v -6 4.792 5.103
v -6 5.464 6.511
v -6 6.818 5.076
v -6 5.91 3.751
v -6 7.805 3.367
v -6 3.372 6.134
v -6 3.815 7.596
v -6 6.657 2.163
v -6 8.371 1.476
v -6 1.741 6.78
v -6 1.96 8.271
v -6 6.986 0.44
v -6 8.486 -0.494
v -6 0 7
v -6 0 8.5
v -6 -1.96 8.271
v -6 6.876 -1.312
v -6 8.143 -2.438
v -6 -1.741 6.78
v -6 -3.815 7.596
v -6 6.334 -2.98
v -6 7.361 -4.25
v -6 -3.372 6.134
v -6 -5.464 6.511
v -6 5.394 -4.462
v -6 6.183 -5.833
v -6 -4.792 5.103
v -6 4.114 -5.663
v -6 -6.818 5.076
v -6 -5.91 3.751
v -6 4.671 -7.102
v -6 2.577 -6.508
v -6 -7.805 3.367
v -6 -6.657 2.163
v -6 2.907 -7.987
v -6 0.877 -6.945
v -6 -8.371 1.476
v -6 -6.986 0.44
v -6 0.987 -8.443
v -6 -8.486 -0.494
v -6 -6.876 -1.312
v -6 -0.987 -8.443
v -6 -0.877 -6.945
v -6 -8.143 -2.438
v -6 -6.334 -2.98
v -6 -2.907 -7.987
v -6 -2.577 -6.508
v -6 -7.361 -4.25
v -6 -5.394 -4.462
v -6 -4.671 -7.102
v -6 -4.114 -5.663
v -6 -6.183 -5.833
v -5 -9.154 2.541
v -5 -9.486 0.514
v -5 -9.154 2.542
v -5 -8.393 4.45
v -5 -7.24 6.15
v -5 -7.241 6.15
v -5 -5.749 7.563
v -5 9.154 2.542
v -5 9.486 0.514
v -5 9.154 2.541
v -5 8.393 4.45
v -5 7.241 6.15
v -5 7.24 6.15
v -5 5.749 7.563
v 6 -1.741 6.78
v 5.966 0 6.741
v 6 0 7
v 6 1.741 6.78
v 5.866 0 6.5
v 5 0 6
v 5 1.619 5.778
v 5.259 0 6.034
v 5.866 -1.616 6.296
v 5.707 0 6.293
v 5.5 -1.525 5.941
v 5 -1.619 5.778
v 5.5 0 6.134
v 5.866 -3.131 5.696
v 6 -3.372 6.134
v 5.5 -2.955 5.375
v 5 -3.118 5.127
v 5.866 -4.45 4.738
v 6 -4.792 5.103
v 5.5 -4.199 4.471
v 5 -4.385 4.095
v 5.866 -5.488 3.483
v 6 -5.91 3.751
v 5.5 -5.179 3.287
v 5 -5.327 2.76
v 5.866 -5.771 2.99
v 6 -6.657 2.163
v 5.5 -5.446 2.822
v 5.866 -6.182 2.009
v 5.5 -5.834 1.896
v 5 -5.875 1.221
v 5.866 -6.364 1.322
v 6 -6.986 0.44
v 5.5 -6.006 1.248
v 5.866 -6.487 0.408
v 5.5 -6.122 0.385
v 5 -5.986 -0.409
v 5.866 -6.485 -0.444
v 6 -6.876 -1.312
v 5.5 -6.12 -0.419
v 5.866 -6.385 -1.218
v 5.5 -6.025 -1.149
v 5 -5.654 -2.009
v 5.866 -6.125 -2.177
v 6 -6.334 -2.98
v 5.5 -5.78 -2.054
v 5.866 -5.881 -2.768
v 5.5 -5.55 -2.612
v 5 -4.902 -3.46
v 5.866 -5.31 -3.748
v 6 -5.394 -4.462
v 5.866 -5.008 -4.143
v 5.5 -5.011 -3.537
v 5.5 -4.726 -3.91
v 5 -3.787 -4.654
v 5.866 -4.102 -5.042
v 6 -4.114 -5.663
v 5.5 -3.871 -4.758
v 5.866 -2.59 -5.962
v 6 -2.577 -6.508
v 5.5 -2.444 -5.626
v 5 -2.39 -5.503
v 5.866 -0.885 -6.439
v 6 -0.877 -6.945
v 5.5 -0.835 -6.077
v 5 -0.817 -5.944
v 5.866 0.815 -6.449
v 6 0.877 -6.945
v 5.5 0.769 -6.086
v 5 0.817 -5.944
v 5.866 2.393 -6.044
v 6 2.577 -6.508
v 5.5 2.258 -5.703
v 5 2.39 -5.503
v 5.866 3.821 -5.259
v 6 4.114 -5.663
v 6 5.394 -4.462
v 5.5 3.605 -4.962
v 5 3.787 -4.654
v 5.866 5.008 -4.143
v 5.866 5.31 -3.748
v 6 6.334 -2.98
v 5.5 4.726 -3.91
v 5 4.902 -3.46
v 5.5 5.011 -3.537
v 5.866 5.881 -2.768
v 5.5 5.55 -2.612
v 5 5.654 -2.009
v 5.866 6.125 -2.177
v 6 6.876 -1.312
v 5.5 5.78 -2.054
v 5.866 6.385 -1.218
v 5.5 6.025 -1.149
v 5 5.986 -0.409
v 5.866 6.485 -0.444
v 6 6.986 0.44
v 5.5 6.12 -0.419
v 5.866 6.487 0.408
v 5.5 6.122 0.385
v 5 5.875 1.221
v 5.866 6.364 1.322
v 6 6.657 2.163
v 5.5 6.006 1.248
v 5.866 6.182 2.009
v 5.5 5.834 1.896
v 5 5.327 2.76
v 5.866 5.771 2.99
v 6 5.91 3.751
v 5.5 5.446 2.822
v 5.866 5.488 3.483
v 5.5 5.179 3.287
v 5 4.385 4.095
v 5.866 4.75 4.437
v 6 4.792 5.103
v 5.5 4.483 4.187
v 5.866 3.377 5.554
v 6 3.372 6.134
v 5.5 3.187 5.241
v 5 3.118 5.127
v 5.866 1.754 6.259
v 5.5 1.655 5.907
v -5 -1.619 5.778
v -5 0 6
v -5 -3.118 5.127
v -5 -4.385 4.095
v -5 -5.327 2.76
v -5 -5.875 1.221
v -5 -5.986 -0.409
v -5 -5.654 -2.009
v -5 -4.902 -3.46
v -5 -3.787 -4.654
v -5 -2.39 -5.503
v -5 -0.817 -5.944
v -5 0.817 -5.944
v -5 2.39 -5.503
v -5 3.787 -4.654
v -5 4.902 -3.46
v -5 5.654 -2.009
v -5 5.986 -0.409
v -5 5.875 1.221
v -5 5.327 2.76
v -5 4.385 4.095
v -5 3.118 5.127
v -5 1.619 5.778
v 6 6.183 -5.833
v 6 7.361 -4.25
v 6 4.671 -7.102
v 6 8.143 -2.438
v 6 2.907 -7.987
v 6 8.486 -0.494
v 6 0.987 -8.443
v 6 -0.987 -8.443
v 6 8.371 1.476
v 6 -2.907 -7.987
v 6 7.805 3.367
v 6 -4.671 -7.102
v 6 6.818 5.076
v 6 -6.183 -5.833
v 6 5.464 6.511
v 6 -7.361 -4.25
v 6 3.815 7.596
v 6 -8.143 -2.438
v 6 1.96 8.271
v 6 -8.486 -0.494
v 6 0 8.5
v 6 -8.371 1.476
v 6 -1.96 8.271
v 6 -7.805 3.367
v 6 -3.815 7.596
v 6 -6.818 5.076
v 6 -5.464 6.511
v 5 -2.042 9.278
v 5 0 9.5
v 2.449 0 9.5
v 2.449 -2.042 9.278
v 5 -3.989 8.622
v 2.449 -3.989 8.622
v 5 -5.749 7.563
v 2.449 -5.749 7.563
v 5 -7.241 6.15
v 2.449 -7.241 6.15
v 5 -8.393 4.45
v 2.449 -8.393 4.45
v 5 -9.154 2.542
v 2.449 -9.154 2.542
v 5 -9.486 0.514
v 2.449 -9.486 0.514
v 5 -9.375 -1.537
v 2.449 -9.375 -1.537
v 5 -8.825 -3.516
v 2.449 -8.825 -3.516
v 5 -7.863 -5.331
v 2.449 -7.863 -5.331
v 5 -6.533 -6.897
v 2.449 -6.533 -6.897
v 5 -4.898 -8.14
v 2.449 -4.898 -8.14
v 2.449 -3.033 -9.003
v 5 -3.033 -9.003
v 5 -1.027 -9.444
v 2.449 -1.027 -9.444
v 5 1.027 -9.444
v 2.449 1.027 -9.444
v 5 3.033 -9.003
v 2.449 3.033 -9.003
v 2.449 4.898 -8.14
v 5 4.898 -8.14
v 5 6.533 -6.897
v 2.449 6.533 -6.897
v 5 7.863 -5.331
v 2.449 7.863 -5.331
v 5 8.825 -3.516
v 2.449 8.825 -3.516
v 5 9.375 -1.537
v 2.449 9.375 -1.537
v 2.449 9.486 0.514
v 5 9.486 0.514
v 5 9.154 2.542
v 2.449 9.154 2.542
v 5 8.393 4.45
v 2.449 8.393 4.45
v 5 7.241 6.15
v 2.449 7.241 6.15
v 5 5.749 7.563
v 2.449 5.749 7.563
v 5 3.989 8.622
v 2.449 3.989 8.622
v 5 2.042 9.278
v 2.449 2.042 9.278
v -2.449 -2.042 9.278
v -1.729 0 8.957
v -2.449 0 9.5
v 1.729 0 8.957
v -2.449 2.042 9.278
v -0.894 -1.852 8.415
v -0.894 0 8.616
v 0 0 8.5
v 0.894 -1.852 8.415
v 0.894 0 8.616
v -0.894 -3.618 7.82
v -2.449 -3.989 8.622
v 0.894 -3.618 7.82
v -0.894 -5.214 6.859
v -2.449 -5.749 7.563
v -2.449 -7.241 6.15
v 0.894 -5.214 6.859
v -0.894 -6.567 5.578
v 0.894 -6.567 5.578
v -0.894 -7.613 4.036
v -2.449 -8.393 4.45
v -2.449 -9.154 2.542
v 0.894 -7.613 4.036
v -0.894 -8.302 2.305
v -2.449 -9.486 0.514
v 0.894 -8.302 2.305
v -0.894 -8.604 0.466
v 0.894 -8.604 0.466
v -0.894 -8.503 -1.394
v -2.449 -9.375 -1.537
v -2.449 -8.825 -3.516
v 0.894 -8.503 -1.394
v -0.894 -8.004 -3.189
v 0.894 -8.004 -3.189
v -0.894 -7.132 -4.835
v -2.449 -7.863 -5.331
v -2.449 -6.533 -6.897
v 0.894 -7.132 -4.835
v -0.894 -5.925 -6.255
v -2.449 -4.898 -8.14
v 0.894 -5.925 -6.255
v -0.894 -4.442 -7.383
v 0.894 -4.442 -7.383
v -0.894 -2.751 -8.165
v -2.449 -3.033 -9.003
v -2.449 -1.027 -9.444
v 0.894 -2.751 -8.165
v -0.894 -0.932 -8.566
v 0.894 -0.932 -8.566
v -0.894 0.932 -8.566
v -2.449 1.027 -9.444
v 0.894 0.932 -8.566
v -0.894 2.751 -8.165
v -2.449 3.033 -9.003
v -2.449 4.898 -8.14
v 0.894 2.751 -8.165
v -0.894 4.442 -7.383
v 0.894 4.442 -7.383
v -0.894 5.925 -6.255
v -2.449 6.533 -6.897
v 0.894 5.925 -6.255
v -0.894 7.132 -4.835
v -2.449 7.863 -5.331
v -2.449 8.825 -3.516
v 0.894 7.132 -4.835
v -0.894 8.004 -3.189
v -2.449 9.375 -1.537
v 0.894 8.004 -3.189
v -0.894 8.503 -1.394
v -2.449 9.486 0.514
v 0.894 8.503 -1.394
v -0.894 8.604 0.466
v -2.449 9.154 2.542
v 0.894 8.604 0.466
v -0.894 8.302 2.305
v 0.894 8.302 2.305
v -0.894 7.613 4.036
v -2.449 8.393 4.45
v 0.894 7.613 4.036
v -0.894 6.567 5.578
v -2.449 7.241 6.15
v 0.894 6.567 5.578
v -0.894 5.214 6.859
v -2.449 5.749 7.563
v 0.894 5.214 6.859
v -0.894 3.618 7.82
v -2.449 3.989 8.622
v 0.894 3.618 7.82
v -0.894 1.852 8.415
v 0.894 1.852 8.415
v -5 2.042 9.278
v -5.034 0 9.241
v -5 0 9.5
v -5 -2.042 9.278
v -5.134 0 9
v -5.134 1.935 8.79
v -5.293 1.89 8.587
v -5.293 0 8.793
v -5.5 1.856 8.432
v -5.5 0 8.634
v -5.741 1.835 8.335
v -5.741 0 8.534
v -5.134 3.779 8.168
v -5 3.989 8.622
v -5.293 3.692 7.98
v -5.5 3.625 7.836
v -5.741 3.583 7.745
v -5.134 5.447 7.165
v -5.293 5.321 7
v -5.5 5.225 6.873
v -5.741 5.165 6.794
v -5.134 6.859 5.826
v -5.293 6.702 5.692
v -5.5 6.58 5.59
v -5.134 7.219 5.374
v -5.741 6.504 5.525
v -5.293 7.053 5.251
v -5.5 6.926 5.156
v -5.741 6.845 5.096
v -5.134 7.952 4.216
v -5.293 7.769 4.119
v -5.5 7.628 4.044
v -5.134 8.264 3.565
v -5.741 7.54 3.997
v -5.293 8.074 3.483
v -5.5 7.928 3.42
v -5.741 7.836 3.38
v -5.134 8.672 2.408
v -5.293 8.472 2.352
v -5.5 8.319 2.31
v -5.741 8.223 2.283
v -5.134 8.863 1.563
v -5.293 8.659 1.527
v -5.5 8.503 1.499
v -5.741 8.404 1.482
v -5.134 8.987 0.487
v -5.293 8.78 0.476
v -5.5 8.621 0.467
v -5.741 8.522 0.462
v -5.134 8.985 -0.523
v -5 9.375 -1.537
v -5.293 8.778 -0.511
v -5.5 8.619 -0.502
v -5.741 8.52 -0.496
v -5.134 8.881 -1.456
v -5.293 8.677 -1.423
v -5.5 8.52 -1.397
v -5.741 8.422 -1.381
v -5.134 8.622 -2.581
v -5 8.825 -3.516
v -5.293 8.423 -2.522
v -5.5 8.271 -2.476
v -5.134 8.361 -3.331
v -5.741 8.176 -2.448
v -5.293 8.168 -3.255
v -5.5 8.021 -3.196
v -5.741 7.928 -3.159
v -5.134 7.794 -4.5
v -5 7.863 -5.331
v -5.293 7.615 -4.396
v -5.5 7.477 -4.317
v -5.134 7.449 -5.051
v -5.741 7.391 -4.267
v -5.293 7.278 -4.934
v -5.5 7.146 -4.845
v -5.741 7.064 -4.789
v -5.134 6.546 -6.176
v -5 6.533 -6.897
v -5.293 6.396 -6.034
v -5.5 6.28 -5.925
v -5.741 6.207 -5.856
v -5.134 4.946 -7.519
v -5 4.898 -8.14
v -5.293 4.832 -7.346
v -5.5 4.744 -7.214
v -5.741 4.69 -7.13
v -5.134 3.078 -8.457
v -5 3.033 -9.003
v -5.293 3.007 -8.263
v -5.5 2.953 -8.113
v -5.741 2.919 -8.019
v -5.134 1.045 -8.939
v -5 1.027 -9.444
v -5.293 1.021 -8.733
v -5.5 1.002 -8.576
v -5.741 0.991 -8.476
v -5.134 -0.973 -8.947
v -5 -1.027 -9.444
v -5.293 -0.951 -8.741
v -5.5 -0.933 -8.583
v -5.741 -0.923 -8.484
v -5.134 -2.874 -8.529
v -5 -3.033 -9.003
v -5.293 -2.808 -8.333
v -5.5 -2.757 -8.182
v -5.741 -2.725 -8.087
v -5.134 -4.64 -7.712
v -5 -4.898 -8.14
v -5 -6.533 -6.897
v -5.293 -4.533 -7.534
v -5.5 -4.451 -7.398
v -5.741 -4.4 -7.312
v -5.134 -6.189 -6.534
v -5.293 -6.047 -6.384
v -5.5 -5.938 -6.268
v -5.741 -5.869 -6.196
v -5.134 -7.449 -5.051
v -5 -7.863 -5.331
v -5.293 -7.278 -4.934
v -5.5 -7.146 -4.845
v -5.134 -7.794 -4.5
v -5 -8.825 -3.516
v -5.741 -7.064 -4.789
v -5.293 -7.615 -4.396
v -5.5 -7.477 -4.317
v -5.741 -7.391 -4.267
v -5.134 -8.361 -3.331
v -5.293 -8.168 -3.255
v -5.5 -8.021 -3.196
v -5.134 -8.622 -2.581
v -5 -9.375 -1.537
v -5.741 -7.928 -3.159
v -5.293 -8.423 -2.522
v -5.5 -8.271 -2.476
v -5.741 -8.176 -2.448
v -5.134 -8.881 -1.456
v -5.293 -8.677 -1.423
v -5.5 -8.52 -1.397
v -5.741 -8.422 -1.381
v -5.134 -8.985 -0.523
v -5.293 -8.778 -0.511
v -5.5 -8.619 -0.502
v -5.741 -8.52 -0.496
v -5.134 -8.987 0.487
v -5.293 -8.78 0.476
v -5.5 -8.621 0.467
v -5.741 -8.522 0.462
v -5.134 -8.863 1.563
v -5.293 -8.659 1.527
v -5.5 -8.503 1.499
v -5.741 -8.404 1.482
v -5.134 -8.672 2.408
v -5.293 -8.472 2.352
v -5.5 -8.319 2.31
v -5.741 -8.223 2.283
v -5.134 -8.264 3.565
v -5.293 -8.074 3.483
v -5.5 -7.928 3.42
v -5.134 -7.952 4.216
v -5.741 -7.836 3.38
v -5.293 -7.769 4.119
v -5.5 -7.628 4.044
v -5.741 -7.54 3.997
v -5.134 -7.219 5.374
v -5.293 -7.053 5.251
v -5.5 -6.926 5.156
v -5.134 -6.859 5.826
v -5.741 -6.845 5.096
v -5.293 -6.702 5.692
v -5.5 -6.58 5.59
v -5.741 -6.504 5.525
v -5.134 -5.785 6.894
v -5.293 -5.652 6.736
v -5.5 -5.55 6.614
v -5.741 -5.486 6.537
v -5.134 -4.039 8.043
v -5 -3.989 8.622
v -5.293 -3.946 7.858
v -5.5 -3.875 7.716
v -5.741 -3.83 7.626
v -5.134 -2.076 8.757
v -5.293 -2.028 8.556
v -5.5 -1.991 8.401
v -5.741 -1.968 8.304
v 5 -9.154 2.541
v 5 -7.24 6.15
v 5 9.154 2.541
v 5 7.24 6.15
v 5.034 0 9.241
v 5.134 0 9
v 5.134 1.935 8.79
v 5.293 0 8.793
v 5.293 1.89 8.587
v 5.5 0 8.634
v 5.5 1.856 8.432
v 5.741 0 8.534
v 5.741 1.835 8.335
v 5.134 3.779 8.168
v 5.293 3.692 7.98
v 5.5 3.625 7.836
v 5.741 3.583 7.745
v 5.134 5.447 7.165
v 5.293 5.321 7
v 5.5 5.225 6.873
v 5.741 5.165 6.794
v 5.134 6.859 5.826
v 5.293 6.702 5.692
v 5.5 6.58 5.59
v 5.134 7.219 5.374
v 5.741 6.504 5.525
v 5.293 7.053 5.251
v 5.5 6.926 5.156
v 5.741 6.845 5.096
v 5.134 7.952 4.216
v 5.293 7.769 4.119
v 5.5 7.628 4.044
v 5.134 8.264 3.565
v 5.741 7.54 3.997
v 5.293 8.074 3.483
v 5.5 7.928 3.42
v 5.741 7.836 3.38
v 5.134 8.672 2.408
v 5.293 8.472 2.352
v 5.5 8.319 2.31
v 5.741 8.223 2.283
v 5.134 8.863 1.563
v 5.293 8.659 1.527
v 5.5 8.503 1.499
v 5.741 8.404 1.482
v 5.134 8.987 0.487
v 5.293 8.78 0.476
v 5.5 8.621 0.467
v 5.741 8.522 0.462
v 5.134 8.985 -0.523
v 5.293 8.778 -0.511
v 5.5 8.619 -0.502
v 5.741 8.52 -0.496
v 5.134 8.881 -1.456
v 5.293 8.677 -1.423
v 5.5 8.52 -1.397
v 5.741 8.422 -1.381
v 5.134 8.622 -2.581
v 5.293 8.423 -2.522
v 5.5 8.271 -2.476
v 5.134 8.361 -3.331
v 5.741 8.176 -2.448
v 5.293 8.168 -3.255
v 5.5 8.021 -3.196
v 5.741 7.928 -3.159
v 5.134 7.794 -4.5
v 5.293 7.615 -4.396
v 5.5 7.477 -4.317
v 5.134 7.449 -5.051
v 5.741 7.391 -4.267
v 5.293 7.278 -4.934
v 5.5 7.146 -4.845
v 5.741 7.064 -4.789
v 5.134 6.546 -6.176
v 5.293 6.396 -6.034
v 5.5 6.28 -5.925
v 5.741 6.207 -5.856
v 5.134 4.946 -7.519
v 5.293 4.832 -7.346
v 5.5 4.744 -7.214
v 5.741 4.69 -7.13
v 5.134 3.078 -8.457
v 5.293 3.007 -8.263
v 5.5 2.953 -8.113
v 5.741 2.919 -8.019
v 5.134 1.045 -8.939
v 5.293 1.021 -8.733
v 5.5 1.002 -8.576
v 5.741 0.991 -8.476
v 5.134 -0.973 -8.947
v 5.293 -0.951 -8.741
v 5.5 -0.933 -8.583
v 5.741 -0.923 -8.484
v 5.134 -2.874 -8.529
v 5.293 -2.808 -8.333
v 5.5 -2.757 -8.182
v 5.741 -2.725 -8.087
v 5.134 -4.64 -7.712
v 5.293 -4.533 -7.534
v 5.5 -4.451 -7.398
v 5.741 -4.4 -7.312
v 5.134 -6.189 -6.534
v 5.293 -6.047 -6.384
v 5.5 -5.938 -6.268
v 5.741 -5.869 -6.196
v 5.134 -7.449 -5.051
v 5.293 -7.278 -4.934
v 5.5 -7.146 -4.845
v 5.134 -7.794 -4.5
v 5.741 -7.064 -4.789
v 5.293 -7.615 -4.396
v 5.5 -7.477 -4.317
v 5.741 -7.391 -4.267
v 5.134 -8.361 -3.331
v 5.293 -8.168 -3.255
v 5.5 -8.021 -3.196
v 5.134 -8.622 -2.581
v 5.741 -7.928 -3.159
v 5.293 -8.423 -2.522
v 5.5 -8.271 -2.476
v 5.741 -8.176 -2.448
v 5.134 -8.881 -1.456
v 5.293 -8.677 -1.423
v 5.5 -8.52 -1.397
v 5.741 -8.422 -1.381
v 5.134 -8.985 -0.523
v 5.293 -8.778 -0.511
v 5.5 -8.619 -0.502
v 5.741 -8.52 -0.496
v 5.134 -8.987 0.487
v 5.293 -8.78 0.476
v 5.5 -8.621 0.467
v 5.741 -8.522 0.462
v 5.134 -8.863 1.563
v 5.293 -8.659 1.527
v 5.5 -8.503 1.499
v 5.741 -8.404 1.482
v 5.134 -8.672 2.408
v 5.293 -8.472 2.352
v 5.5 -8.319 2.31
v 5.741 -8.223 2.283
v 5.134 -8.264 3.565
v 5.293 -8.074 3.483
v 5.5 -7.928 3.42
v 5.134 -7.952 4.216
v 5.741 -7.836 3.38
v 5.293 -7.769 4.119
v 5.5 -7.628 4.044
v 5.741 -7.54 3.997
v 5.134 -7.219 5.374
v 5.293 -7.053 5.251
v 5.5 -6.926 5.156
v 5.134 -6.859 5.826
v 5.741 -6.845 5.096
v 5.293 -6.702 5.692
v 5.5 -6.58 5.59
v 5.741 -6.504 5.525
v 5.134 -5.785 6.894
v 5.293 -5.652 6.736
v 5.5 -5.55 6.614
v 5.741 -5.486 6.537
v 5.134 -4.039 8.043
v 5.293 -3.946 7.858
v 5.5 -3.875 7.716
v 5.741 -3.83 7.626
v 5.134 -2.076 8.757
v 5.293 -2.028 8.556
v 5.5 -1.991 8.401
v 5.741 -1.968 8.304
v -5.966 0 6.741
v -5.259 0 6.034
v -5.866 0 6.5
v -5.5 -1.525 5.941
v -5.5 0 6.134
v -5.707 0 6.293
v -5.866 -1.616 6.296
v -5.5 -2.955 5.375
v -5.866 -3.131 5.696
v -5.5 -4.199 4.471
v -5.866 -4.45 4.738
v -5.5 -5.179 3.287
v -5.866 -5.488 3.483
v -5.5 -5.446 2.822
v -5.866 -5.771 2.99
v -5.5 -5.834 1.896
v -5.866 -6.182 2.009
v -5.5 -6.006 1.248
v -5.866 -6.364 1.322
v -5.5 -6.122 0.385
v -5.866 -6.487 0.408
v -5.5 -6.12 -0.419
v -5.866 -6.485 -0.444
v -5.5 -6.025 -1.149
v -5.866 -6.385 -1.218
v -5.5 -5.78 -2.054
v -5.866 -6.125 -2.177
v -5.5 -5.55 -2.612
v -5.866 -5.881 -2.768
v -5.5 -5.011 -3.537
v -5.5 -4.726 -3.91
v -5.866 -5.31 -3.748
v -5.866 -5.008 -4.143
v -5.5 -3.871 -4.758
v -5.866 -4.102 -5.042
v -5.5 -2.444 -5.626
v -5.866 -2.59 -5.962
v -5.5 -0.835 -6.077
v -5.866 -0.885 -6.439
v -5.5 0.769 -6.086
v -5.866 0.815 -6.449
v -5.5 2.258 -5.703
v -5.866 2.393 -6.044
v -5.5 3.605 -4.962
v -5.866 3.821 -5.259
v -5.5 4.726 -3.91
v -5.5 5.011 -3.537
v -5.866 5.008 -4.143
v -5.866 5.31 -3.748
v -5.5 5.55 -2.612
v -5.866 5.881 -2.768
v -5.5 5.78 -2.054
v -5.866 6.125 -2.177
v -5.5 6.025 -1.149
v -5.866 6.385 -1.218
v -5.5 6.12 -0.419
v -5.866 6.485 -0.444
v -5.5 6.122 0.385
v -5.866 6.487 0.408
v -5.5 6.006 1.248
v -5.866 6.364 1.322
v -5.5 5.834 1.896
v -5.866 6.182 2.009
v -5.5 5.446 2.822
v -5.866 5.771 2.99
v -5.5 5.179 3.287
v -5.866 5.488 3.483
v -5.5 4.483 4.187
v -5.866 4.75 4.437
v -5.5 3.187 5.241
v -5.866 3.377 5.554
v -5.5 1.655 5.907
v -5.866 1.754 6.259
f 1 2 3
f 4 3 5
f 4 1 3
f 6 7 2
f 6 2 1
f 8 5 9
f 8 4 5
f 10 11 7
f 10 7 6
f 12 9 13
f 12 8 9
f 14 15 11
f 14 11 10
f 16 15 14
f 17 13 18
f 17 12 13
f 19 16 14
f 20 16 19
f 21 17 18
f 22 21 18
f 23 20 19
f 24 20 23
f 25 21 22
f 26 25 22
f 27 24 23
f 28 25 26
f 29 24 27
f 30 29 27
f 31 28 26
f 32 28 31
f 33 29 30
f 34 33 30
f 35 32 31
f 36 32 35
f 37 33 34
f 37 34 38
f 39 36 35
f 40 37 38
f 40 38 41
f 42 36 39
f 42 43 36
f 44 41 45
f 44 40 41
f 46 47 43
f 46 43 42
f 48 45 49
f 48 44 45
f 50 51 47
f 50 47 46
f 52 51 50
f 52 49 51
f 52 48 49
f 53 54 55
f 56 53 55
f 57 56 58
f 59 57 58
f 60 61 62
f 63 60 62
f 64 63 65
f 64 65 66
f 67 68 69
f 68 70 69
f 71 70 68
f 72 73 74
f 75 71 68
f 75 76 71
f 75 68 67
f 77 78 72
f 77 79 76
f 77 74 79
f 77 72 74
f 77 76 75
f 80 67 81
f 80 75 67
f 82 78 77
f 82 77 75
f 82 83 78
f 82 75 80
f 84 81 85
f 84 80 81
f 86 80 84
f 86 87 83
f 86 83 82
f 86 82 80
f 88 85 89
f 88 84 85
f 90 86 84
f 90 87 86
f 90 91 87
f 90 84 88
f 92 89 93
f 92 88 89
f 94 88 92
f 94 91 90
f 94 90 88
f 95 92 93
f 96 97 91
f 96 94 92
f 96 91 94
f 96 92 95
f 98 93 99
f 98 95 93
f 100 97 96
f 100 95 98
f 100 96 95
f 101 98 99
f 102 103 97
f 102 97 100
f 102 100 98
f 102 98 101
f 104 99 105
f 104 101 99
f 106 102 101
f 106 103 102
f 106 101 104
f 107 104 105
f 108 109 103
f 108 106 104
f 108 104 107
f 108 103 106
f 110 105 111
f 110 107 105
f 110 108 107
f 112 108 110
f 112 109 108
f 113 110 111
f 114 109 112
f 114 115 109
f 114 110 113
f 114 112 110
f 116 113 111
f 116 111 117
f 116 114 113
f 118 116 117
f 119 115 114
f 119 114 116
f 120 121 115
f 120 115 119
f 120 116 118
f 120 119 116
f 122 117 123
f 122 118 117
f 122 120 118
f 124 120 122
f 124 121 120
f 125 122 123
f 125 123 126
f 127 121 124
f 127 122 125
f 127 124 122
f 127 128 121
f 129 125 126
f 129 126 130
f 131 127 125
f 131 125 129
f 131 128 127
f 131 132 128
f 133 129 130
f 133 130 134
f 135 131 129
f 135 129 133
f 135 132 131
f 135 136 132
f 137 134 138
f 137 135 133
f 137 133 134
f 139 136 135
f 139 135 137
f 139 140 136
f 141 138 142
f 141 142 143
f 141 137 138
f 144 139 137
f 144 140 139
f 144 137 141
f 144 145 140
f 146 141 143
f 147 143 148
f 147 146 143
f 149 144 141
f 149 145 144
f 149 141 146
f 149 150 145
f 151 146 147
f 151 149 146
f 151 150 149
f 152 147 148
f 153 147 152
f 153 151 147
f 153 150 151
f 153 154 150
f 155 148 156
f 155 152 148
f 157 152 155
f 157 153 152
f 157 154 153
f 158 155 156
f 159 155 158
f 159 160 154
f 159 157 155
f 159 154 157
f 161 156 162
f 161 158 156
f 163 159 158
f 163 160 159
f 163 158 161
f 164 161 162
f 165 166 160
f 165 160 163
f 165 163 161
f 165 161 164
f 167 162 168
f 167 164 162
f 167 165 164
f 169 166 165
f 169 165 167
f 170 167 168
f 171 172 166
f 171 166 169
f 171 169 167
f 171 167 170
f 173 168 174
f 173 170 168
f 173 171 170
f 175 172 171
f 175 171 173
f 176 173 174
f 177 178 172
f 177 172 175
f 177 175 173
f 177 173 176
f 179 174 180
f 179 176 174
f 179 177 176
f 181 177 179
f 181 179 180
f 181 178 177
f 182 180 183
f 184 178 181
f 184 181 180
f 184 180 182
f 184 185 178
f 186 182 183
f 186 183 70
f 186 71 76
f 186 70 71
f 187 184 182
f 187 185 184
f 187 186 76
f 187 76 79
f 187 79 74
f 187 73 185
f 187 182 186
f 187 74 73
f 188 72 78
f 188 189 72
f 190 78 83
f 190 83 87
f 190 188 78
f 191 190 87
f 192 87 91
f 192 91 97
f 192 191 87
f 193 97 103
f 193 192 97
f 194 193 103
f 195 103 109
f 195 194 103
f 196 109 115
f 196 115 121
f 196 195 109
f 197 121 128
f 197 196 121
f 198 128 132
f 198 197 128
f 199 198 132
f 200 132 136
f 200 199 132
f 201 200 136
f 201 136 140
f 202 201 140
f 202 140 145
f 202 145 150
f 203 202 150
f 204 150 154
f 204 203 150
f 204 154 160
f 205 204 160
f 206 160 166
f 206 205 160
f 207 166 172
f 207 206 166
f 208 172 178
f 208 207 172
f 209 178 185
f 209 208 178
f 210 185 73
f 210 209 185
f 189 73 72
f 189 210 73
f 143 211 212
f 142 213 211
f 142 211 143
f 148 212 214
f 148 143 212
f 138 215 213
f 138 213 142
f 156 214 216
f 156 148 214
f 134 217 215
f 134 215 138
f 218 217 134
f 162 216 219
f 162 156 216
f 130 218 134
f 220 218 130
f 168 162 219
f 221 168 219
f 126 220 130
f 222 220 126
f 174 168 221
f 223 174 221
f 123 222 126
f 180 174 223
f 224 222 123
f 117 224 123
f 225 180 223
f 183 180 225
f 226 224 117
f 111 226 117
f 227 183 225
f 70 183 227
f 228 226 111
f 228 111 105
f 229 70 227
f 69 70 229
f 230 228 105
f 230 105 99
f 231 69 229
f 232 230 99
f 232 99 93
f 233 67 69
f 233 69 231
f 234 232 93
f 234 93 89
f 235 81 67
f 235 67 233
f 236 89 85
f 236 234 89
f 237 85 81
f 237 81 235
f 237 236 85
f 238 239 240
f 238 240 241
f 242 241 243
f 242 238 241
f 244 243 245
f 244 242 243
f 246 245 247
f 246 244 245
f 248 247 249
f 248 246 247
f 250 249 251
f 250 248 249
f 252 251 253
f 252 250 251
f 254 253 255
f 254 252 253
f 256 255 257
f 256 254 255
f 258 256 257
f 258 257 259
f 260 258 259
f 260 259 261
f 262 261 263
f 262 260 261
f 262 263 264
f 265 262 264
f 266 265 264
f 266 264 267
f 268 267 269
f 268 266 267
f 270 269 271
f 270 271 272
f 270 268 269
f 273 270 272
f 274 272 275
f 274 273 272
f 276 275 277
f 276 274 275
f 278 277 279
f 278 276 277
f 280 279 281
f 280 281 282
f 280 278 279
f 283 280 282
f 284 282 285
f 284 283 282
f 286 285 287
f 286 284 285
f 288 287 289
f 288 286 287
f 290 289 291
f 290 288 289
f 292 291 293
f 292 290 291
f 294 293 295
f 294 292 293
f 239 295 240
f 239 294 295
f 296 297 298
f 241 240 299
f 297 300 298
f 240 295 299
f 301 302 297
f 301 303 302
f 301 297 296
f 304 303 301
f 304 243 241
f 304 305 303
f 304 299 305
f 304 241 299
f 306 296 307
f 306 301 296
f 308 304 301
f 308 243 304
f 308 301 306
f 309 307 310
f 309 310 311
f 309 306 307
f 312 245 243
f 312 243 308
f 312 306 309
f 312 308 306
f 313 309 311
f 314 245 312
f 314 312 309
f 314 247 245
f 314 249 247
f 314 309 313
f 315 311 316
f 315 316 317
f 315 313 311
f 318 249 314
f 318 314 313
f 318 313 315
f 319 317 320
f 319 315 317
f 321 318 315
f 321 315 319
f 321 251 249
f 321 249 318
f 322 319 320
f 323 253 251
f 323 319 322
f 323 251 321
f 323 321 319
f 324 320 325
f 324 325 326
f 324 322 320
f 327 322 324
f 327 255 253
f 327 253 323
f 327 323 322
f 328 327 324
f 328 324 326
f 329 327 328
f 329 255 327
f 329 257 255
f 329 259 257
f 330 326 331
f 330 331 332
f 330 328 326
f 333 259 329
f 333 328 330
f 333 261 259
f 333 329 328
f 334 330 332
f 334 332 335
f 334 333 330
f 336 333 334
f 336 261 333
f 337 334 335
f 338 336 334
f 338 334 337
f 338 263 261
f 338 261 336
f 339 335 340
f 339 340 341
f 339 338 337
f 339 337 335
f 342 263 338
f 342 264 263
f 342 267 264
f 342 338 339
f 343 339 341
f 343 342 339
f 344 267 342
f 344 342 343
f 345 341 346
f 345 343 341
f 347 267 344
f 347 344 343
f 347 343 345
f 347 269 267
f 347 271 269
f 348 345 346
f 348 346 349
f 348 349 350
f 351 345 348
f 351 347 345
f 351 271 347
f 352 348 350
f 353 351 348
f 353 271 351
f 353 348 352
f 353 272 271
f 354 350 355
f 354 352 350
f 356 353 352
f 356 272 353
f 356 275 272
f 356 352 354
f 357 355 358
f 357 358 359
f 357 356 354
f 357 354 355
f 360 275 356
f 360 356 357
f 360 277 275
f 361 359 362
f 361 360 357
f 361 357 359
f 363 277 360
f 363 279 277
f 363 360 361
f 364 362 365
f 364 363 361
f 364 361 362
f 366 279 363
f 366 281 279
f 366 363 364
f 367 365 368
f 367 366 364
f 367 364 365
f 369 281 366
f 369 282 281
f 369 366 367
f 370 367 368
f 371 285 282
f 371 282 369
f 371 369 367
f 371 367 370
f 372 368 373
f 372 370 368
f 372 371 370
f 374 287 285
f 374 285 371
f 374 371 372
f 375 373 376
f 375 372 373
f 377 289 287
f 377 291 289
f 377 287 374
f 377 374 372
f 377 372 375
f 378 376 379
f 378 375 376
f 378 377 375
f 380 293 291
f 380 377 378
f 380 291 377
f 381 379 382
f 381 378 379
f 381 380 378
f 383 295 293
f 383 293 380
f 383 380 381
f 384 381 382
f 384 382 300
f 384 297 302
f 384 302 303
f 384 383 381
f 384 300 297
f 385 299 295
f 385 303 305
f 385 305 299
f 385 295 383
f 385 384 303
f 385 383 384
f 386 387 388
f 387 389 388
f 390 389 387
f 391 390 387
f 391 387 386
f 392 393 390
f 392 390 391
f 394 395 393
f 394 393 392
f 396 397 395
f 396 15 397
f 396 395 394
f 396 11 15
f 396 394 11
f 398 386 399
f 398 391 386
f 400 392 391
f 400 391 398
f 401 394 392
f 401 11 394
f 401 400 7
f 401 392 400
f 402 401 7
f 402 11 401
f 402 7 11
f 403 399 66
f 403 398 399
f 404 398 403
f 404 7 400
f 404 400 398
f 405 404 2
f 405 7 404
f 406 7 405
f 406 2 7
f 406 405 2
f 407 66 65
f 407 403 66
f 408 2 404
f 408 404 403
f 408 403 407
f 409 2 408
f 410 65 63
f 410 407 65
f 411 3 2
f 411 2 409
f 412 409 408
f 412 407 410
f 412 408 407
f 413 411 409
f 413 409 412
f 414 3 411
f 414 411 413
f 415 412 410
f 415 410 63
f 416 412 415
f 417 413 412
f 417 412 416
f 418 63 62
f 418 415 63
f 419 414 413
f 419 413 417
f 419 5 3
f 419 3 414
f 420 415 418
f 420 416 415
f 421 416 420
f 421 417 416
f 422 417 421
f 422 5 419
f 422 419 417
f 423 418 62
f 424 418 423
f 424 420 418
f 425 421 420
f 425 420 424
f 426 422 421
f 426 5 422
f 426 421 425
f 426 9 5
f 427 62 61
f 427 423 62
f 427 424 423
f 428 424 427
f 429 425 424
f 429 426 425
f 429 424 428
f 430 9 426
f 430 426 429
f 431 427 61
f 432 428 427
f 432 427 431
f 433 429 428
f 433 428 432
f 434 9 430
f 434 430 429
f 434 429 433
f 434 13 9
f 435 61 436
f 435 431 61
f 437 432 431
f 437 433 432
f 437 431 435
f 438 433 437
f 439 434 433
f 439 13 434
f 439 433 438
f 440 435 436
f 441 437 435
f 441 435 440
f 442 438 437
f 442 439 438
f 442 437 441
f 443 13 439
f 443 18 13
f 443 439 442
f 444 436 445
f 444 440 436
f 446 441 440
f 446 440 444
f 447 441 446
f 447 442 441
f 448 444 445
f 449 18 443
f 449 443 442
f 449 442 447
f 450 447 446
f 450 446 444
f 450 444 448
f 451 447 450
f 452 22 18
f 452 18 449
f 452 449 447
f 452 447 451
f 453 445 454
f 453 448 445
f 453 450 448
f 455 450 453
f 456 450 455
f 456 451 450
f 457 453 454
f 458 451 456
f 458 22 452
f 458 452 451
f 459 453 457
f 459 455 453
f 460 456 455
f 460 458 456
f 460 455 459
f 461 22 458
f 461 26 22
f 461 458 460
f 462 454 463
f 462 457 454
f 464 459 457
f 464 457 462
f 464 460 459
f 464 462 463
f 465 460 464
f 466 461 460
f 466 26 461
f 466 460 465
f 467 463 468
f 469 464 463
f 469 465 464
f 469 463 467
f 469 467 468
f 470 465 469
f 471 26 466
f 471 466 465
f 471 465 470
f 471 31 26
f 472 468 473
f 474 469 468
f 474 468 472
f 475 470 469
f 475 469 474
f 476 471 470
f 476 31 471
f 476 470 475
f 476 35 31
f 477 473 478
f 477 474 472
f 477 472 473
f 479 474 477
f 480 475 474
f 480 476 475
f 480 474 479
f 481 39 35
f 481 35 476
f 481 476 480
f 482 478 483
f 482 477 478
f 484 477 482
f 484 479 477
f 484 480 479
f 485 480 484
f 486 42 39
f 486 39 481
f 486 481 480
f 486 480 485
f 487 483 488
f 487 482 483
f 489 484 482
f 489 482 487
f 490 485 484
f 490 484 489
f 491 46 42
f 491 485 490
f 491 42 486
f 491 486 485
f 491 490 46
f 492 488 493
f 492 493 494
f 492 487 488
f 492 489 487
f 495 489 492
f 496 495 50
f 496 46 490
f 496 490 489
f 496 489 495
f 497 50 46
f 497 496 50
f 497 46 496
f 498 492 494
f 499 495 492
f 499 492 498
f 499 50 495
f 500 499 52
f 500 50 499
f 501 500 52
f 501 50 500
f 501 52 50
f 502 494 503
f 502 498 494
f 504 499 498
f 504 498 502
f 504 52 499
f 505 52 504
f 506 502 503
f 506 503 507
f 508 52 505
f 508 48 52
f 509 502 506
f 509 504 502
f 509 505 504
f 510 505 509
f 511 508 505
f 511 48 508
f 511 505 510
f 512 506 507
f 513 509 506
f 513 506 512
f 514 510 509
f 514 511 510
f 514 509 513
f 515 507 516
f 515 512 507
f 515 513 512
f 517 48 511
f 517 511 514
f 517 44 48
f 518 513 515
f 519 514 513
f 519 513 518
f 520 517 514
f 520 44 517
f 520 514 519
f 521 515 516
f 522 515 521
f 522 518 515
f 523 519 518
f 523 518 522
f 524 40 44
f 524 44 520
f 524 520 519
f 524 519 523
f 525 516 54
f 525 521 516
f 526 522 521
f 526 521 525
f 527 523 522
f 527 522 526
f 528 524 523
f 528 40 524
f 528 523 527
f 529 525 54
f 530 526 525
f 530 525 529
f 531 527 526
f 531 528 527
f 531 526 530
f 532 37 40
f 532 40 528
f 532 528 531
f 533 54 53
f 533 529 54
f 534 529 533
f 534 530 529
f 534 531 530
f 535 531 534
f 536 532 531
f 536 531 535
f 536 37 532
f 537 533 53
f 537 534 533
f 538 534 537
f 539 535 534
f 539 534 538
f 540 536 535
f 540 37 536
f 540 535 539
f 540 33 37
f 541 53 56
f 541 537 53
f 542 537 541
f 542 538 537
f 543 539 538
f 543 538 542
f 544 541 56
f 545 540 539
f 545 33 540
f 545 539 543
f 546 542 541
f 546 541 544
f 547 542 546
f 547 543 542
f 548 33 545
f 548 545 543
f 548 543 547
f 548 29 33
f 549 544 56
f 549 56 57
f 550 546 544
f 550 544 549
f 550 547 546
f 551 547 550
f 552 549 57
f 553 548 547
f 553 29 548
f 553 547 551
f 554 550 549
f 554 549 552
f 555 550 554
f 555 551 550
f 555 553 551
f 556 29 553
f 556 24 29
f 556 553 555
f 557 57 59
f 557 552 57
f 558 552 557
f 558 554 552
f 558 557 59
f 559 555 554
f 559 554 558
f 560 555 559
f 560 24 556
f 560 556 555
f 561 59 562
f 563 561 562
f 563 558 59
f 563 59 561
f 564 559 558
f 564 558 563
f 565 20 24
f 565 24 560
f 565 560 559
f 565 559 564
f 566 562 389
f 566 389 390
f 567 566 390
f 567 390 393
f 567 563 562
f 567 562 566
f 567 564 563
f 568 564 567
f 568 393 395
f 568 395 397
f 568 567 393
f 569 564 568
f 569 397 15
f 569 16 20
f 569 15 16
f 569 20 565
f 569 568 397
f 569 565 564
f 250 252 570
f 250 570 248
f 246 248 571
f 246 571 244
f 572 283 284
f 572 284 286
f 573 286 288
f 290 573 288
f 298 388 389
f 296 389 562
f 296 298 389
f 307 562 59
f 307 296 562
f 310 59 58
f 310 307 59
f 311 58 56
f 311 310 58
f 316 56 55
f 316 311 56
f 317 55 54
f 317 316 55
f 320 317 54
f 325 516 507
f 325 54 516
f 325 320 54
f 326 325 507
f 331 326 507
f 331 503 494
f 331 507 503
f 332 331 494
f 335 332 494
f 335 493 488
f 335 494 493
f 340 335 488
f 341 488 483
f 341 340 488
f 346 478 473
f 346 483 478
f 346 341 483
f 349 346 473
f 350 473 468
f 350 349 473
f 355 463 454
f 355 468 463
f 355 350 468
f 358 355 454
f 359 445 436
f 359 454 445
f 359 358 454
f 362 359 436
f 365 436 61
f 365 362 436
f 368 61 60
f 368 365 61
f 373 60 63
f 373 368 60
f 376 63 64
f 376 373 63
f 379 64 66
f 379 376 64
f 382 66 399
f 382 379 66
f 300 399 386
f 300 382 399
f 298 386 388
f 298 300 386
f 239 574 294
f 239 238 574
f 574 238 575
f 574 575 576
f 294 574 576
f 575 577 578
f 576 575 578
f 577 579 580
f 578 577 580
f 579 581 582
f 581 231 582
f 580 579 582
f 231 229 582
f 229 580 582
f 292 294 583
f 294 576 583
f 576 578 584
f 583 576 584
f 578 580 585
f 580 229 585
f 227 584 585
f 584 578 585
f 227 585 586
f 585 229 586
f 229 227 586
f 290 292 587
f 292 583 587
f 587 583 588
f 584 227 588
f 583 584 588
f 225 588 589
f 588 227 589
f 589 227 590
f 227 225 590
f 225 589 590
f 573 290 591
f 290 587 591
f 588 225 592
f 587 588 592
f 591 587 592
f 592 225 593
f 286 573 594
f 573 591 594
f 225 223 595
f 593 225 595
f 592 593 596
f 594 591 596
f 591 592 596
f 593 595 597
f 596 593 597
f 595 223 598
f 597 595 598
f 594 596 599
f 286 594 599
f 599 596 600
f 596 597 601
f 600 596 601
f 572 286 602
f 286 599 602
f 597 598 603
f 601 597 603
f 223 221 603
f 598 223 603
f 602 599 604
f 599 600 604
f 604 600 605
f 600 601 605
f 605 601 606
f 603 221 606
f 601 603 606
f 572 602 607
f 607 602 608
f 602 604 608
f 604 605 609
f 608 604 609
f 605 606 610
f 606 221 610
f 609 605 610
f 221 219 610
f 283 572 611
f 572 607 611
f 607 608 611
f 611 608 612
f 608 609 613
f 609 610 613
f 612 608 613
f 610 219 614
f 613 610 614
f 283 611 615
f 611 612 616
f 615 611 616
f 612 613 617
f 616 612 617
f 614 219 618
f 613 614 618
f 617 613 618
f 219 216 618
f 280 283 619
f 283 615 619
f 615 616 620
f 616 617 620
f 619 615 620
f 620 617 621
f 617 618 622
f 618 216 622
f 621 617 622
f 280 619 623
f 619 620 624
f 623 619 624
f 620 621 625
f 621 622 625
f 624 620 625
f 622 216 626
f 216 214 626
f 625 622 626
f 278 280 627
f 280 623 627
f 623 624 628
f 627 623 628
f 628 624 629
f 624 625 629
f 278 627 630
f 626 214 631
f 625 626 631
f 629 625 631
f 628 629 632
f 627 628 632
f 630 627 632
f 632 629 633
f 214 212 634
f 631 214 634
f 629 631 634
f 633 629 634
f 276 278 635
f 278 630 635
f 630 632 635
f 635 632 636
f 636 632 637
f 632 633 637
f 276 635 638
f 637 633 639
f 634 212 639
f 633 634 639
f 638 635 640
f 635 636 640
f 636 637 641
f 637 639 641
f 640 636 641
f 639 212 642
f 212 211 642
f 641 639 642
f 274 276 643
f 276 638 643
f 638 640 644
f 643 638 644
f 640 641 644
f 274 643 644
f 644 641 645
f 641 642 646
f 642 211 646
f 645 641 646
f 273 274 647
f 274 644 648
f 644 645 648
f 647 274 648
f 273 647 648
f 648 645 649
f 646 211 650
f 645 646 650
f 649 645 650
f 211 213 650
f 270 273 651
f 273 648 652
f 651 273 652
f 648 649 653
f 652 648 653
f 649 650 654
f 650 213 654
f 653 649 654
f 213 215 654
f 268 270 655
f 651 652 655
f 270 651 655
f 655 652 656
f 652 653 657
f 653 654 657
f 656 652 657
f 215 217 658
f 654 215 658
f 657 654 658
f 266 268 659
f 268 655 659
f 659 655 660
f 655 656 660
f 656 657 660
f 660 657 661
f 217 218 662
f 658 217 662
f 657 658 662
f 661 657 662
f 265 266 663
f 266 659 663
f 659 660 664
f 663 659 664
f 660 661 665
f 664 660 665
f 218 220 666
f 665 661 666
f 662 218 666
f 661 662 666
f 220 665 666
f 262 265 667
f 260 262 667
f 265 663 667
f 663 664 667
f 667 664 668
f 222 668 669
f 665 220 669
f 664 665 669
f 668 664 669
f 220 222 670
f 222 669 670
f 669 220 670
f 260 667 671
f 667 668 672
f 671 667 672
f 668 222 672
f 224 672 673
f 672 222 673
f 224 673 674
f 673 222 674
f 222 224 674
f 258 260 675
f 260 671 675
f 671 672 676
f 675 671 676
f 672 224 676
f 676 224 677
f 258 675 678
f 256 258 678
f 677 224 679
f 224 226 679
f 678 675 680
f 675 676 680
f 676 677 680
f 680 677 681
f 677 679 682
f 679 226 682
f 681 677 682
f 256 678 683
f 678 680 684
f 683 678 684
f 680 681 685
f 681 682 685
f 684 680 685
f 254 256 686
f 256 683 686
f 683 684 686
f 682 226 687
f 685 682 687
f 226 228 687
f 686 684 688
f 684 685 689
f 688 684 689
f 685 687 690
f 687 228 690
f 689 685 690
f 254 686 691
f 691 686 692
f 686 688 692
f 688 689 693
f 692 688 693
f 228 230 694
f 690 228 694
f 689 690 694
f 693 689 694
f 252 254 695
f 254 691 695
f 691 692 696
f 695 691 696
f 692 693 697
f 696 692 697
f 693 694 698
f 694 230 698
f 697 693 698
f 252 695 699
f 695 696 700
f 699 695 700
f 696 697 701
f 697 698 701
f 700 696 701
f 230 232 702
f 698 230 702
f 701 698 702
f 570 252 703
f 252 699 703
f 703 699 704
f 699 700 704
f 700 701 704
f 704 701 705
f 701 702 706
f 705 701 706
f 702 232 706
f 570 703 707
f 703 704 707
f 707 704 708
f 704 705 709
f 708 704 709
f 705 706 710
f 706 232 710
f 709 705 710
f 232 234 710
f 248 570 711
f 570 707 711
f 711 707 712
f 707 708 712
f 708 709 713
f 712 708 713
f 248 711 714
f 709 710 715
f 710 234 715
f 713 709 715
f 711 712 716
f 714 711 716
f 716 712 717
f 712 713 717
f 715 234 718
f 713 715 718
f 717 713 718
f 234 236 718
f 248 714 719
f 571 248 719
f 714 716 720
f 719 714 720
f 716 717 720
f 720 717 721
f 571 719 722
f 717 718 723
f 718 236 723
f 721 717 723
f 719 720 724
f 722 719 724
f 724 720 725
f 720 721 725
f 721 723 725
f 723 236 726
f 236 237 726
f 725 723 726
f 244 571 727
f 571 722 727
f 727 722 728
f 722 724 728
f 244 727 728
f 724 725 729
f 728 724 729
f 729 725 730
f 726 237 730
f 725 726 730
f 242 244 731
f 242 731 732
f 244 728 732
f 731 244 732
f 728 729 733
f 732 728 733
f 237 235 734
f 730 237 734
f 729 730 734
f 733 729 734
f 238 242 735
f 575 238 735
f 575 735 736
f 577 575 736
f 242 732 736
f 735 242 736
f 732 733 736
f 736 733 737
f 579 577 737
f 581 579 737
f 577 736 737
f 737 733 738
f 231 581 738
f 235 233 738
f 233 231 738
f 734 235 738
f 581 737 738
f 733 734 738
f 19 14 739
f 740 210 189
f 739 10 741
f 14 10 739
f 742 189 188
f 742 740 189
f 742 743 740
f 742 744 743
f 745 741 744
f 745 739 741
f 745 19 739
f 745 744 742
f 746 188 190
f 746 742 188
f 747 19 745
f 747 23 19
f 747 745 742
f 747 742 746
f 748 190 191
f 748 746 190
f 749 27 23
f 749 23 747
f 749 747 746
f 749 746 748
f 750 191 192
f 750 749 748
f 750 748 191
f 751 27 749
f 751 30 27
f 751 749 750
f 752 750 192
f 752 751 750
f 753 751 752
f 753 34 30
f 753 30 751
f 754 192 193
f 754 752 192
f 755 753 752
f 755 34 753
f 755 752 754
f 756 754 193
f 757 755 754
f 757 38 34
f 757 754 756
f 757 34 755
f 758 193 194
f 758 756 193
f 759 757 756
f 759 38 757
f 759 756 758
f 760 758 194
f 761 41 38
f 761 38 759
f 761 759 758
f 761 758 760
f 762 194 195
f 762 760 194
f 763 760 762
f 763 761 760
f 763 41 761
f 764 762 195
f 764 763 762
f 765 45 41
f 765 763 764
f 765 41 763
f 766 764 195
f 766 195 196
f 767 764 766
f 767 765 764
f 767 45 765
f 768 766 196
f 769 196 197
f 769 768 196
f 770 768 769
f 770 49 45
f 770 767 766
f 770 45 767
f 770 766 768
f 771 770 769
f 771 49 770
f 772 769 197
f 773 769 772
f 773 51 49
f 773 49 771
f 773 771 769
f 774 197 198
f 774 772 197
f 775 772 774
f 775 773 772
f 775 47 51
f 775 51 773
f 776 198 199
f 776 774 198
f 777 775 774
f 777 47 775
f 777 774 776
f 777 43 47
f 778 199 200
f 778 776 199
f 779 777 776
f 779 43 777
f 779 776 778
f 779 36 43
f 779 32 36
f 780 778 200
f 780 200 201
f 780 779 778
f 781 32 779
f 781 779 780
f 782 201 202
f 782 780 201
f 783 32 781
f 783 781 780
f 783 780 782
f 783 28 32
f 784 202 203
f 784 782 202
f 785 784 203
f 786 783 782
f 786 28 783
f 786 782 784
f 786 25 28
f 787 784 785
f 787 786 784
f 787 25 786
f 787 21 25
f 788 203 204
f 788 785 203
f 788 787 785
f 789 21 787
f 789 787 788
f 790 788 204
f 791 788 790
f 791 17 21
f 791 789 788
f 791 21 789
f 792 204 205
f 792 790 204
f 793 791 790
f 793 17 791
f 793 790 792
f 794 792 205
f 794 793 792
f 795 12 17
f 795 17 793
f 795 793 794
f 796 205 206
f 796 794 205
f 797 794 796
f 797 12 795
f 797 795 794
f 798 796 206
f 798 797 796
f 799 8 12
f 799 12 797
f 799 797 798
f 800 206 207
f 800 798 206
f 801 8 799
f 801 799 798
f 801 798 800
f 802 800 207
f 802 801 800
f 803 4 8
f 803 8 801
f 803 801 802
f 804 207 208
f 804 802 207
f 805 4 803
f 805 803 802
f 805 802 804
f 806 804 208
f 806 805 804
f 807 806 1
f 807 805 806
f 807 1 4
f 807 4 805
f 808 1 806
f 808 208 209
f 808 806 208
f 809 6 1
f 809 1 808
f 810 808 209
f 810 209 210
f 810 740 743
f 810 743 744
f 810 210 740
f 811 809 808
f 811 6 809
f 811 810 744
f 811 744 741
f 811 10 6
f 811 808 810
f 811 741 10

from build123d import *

# Parameters (mm, degrees)
CUT_EXTRUDE1_START = -1
SKETCH3_R          = 9.5
SKETCH3_R_2        = 8.5
CUT_EXTRUDE1_DEPTH = 1
FILLET1_R          = 1


with BuildPart() as part:
    # Sketch2 → Revolve1 (revolve)
    with BuildSketch(Plane.XY, mode=Mode.PRIVATE) as revolve1_sk:
        with BuildLine():
            Line((-6, 9.5), (-2.449489743, 9.5))
            ThreePointArc((-2.449489743, 9.5), (0, 8.5), (2.449489743, 9.5))
            Line((2.449489743, 9.5), (6, 9.5))
            Line((6, 9.5), (6, 7))
            ThreePointArc((6, 7), (5.707106781, 6.292893219), (5, 6))
            Line((5, 6), (-5, 6))
            ThreePointArc((-5, 6), (-5.707106781, 6.292893219), (-6, 7))
            Line((-6, 7), (-6, 9.5))
        make_face()
    revolve(revolve1_sk.sketch.rotate(Axis((-6, 0, 0), (1, 0, 0)), 90), axis=Axis((-6, 0, 0), (1, 0, 0)))

    # Sketch3 → Cut-Extrude1 (cut)
    with BuildSketch(Plane.ZY.offset(6).offset(CUT_EXTRUDE1_START)):
        Circle(SKETCH3_R)
        Circle(SKETCH3_R_2, mode=Mode.SUBTRACT)
    cut_extrude1 = extrude(amount=CUT_EXTRUDE1_DEPTH, mode=Mode.SUBTRACT)

    # Mirror1: Cut-Extrude1 across plane
    add(cut_extrude1.mirror(Plane(origin=(0, 0, 0), x_dir=(0, 0, 1), z_dir=(1, 0, 0))), mode=Mode.SUBTRACT)

    # Fillet1
    fillet1_edges = [part.edges().sort_by_distance(p)[0] for p in [
        (-5, 0, -8.5),
        (5, 0, -8.5),
    ]]
    fillet(fillet1_edges, radius=FILLET1_R - 0.0001)  # a hair under: the kernel refuses the full size


solid = part.part
